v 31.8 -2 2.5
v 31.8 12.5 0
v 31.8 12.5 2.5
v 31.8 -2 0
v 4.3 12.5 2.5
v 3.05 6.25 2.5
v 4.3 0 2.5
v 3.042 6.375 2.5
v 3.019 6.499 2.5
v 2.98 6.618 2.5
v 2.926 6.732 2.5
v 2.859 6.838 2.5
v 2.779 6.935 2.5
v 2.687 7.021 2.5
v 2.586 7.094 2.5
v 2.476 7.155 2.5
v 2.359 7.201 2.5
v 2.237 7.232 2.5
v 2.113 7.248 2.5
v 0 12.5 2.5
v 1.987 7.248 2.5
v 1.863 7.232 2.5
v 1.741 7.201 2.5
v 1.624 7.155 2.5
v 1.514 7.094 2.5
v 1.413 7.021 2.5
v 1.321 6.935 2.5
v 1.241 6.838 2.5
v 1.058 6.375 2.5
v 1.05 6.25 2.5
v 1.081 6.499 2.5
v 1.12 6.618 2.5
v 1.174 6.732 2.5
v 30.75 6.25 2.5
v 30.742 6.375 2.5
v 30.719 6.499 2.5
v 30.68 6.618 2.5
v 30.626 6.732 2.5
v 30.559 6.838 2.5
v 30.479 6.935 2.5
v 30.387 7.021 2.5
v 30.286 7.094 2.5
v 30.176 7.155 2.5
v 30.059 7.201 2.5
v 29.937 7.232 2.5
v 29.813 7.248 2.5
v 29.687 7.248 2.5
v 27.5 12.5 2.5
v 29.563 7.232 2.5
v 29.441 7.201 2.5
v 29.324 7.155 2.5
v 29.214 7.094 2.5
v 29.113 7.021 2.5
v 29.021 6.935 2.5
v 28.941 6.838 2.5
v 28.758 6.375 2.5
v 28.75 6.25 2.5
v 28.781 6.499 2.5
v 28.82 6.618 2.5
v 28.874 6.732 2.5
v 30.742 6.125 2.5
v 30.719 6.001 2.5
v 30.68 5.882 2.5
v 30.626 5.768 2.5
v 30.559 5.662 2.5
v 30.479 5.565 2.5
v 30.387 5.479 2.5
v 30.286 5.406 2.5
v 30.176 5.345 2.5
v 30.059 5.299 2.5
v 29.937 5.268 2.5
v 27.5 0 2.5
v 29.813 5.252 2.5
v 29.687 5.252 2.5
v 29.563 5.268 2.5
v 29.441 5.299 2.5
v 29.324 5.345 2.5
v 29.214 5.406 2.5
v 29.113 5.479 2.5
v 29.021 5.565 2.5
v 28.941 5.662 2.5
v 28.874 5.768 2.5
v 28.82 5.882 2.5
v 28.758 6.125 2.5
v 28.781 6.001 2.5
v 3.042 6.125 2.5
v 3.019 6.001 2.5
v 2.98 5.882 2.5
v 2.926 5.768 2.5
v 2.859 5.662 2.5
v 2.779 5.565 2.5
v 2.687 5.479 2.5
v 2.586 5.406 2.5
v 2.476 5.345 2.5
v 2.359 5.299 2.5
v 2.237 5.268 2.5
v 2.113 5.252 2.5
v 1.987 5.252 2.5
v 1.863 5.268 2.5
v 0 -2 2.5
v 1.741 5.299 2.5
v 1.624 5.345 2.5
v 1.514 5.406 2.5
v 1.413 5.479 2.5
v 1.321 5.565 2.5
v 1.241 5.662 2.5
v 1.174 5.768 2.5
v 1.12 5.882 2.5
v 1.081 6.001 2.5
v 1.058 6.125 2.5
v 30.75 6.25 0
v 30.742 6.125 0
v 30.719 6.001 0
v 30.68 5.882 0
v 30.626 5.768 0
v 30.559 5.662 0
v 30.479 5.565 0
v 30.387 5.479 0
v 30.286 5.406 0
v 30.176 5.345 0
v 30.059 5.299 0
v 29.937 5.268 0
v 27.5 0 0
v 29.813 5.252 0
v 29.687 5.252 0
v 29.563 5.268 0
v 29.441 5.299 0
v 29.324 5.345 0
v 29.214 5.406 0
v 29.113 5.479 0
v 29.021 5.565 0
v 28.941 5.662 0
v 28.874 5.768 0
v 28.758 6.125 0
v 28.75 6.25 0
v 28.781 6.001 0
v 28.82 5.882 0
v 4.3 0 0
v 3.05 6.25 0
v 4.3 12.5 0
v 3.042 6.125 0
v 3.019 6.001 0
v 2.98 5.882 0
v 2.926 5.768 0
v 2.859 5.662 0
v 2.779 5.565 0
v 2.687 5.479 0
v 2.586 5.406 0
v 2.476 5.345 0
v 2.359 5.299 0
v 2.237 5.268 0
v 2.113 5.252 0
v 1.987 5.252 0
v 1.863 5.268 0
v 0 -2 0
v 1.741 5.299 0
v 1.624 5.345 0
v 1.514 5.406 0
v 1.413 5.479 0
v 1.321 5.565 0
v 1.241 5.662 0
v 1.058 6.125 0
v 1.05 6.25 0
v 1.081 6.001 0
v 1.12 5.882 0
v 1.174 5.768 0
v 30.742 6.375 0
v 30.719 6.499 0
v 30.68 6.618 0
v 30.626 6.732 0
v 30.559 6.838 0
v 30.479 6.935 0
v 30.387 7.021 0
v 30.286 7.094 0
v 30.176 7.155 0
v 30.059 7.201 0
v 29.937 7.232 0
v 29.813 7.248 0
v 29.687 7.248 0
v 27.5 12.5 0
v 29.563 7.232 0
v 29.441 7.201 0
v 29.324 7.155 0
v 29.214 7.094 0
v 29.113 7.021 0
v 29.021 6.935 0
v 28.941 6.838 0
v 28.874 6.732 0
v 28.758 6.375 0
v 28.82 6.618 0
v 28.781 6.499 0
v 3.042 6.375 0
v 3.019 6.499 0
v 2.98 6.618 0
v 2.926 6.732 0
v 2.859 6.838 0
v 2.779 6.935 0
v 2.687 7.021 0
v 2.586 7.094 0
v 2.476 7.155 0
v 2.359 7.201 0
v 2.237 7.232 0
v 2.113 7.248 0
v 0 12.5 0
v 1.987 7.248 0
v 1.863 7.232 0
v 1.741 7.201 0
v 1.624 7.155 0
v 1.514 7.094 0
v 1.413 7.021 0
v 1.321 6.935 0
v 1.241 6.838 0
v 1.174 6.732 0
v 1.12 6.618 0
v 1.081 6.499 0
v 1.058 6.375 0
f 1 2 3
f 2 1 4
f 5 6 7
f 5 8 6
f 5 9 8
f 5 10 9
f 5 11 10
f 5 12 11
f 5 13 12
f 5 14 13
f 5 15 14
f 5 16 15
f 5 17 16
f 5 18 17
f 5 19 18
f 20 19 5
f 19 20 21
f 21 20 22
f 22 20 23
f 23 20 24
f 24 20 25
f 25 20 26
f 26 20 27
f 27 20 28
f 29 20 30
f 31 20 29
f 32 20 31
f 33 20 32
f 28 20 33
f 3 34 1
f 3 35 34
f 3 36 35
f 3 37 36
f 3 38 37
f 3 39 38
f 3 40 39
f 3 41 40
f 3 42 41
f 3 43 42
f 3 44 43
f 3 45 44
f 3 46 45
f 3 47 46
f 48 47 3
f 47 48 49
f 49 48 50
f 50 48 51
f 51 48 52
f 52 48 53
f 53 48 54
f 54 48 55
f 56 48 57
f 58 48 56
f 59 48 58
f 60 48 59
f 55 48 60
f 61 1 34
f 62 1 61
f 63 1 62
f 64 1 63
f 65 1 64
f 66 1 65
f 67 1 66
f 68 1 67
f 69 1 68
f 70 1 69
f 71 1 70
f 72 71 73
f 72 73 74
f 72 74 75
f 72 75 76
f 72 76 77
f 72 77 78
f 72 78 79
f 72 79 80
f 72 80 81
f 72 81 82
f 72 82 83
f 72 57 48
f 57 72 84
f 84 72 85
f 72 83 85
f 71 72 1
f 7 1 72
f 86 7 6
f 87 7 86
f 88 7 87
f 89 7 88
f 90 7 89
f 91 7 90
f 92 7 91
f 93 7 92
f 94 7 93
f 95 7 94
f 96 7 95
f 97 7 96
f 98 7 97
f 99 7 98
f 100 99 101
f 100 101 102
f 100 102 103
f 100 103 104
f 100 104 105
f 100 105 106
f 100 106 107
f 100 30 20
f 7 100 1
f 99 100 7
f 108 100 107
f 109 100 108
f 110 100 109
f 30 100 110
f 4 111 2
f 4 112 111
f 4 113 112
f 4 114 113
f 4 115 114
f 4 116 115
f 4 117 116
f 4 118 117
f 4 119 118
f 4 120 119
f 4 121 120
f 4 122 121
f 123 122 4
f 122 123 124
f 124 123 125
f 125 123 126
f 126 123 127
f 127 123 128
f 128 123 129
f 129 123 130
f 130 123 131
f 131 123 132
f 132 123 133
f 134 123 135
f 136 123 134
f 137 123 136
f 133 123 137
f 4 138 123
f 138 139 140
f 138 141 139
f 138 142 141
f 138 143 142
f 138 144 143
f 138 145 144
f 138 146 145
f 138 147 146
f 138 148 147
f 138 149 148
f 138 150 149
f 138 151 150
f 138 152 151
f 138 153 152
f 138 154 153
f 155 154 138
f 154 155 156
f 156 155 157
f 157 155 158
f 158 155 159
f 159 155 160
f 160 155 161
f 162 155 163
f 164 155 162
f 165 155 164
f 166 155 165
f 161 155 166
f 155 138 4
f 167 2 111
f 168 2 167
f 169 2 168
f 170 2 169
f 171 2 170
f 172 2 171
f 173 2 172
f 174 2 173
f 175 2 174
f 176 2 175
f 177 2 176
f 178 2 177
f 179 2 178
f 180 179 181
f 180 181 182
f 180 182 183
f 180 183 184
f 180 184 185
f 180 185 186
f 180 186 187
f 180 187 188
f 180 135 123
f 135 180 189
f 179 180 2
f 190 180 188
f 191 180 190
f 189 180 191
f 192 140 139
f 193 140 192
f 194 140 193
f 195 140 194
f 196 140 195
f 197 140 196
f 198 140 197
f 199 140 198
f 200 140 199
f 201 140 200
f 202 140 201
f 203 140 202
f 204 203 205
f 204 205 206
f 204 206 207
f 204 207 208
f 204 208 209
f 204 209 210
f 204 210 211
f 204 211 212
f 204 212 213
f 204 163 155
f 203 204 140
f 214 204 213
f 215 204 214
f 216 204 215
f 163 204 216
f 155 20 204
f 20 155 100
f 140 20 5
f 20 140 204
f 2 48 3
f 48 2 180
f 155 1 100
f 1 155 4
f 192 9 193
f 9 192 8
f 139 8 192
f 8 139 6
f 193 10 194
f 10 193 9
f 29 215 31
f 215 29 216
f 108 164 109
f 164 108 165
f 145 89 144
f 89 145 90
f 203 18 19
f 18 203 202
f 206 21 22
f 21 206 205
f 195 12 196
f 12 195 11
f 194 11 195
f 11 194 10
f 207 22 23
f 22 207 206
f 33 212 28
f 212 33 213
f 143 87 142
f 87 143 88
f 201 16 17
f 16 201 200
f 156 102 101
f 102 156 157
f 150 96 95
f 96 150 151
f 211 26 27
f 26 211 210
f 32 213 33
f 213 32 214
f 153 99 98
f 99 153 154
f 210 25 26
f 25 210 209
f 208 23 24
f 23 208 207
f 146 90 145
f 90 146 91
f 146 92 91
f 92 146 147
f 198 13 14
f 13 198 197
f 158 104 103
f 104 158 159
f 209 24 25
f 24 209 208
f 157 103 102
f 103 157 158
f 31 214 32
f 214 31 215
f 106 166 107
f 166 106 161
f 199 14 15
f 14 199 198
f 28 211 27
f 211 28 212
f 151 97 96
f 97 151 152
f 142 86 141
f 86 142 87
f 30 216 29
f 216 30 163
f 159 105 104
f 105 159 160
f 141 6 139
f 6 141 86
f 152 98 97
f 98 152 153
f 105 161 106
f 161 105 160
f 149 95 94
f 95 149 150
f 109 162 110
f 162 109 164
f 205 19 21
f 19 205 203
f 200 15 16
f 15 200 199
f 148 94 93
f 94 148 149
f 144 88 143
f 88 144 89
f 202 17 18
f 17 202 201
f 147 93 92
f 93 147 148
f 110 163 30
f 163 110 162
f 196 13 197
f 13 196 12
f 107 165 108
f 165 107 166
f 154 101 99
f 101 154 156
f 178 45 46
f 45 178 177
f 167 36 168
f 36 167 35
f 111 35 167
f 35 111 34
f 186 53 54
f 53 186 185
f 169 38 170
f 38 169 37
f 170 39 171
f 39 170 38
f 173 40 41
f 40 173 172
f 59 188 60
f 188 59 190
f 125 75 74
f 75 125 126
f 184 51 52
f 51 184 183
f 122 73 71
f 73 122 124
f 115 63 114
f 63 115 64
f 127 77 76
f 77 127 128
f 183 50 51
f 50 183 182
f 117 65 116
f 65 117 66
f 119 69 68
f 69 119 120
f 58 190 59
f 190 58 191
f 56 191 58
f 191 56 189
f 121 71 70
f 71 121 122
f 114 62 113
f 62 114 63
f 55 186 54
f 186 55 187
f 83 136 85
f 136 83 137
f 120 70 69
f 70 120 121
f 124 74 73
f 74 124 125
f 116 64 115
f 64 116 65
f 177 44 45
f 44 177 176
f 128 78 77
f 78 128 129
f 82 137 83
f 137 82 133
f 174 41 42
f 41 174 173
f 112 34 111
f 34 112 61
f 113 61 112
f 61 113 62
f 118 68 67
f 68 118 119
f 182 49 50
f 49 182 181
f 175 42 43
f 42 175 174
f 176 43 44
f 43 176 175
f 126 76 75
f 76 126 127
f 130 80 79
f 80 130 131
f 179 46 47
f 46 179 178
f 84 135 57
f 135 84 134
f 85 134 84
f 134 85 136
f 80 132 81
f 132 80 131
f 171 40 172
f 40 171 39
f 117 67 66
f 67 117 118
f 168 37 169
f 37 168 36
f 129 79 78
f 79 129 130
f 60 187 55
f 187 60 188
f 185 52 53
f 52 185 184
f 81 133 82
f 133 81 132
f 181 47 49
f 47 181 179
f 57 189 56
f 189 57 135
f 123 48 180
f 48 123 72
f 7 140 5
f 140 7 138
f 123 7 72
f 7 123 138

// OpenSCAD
// file: fillets.scad
// 2d primitive for outside fillets.

module fil_2d_o(r, angle=90) {

  intersection() {

    circle(r=r);

    polygon([

      [0, 0],

      [0, r],

      [r * tan(angle/2), r],

      [r * sin(angle), r * cos(angle)]

    ]);

  }

}



// 2d primitive for inside fillets.

module fil_2d_i(r, angle=90) {

  difference() {

    polygon([

      [0, 0],

      [0, -r],

      [-r * tan(angle/2), -r],

      [-r * sin(angle), -r * cos(angle)]

    ]);

    circle(r=r);

  }

}



// 3d polar outside fillet.

module fil_polar_o(R, r, angle=90) {

  rotate_extrude(convexity=10) {

    translate([R, 0, 0]) {

      fil_2d_o(r, angle);

    }

  }

}



// 3d polar inside fillet.

module fil_polar_i(R, r, angle=90) {

  rotate_extrude(convexity=10) {

    translate([R, 0, 0]) {

      fil_2d_i(r, angle);

    }

  }

}



// 3d linear outside fillet.

module fil_linear_o(l, r, angle=90) {

  rotate([0, -90, 180]) {

    linear_extrude(height=l, center=false) {

      fil_2d_o(r, angle);

    }

  }

}



// 3d linear inside fillet.

module fil_linear_o(l, r, angle=90) {

  rotate([0, -90, 180]) {

    linear_extrude(height=l, center=false) {

      fil_2d_i(r, angle);

    }

  }

}
// main file
use <fillets.scad>

// Based on http://www.thingiverse.com/thing:115972

$fn=50;
fudge=0.1;


servo_arm_hub_radi=7.7/2;
servo_arm_hub_radi2 = servo_arm_hub_radi - 1;
servo_arm_hub_height=4.30;
servo_arm_hub_center_hole_radi=2.4/2;
servo_arm_hub_center_countersink_radi=6/2;
servo_arm_hub_center_countersink_height=0;

servo_arm_tip_radi=4/2;
servo_arm_tip_height=3;
servo_arm_length=26.42;
servo_arm_centerhubtooutterpin=19.49-2*servo_arm_tip_radi-servo_arm_tip_radi;
servo_arm_pin_spacing=9/3;
servo_arm_pin_hole_radi=1.5/2;
servo_arm_fudge_factor=.2;

servo_drive_pin_radi=4.7/2;
servo_drive_pin_height=3.0;

servo_plate_len = 31.8;
servo_plate_width = 12.5;
servo_plate_thickness = 2.5;
servo_plate_screw_radi = 2/2;
servo_plate_screw_distance = 27.7;
servo_plate_screw_offset = (servo_plate_len - servo_plate_screw_distance)/2;
servo_plate_internal_len = 23;


camera_holder_arm_thickness=6.0;
camera_holder_arm_servo_hub_radi=18.5/2;
camera_holder_plate_offset=35;
camera_holder_plate_width=46+(2*camera_holder_arm_thickness);
camera_holder_plate_height=33;
camera_holder_plate_thickness=6;
camera_holder_plate_Attachment_bracket_x=15;
camera_holder_plate_Attachment_bracket_z=3 ;
camera_holder_plate_Attachment_bracket_screw_radi=3.55/2;
camera_holder_plate_Attachment_bracket_screw_nut_size=6.60/2;
camera_holder_plate_Attachment_bracket_screw_offset=9.5;

camera_holder_plate_Attachment_bracket_screw_head_radi=6.5/2;
camera_holder_plate_Attachment_bracket_screw_head_height=3.5;


Plate_Height=4.0;
Plate_Corner_Radi=4;
Plate_X_Size=48;
Plate_Y_Size=48;
Plate_Hole_Radi=3.2/2;

servo_hight = 21.4;

//exploded_view();

//new_exploded_view();

//new_cam_holder();
servo_bracket();
//camera_holder_arm_w_servo_cutout();

//camera_holder_no_cutout();

//camera_holder_arm_w_bearing_cutout();
//camera_holder_arm_w_servo_hub_cutout();

/*
translate([0,0,camera_holder_plate_thickness])
rotate([180,0,0])
camera_holder_plate();
*/

//lower_pivot_bearing_holder();

//upper_pivot_bearing_holder();

//mounting_plate();

//##########################################################
//##########################################################
// Test Stuff Below....
//##########################################################
//##########################################################

//servo_arm(0);
//color("red") translate([10,0,0]) servo_arm_negative();
//camera_holder();

//color("blue")
   //servo();
//MakePlate();

//fil_linear_o(20,2);

//##########################################################
//##########################################################


//##########################################################
module mounting_plate () {
//##########################################################

   mount_height=32;

   difference() {
   union() {
       MakePlate();

     hull() {
      translate([0,10,0])
       cylinder(r=7/2,h=mount_height);
      translate([0,38,0])
       cylinder(r=7/2,h=mount_height);
     }

     hull() {
      translate([Plate_Y_Size,10,0])
       cylinder(r=7/2,h=mount_height);
      translate([Plate_Y_Size,38,0])
       cylinder(r=7/2,h=mount_height);
     }

     hull() {
      translate([0,10,0])
       cylinder(r=7/2,h=mount_height);
      translate([Plate_Y_Size,10,0])
       cylinder(r=7/2,h=mount_height);
     }

     hull() {
      translate([0,38,0])
       cylinder(r=7/2,h=mount_height);
      translate([Plate_Y_Size,38,0])
       cylinder(r=7/2,h=mount_height);
     }

   }

   // Screw Holes
   translate([-.1,19,-fudge+15])
      cylinder(r=3/2,h=20);

   translate([-.1,29,-fudge+15])
      cylinder(r=3/2,h=20);

   translate([48.1,19,-fudge+15])
      cylinder(r=3/2,h=20);

   translate([48.1,29,-fudge+15])
      cylinder(r=3/2,h=20);

   hull() {
   translate([-6.2,Plate_Y_Size/2,7.5])
   rotate([0,90,0])
   cylinder(r=3,h=10);

   translate([-6.2,Plate_Y_Size/2,24])
   rotate([0,90,0])
   cylinder(r=3,h=10);

   }

   hull() {
   translate([44.4,Plate_Y_Size/2,7.5])
   rotate([0,90,0])
   cylinder(r=3,h=10);

   translate([44.4,Plate_Y_Size/2,24])
   rotate([0,90,0])
   cylinder(r=3,h=10);

   }

   translate([Plate_Y_Size/2,13.8,31])
   rotate([90,90,0])
   cylinder(r=20.5,h=10,$fn=200);

   translate([Plate_Y_Size/2,44.2,31])
   rotate([90,90,0])
   cylinder(r=20.5,h=10,$fn=200);


   }


}


//##########################################################


//##########################################################
module exploded_view (angle=0)
//##########################################################
{

    color("Purple")
    translate([camera_holder_plate_width,camera_holder_plate_height/2,
           camera_holder_plate_Attachment_bracket_z+camera_holder_plate_thickness])
        rotate([0,-90,0])
            camera_holder_arm_w_servo_cutout();

    color("Purple")
    translate([0,camera_holder_plate_height/2,
           camera_holder_plate_Attachment_bracket_z+camera_holder_plate_thickness])
         rotate([0,-90,180])
            camera_holder_arm_w_bearing_cutout();

    color("green")
    translate([0,camera_holder_plate_height,camera_holder_plate_thickness])
         rotate([180,0,0])
            camera_holder_plate();

    translate([camera_holder_plate_width-5.5,camera_holder_plate_height/2,camera_holder_plate_offset+camera_holder_plate_thickness+camera_holder_plate_Attachment_bracket_z])
    rotate([0,90,0])
    union() {
        color("Blue")
        servo_arm(0);
        rotate([0,0,angle])
        color("yellow")
        servo();
    }

    color("LightBlue")
    translate([-3.7,camera_holder_plate_height/2,camera_holder_plate_offset+camera_holder_plate_thickness+camera_holder_plate_Attachment_bracket_z])
    rotate([0,90,0])
    upper_pivot_bearing_holder();

    color("LightBlue")
    translate([6.5,camera_holder_plate_height/2,camera_holder_plate_offset+camera_holder_plate_thickness+camera_holder_plate_Attachment_bracket_z])
    rotate([0,-90,0])
    lower_pivot_bearing_holder();

}

//##########################################################
module camera_holder_plate()
//##########################################################
{

    hole1_2_x=camera_holder_plate_Attachment_bracket_z+(camera_holder_arm_thickness/2+.5);
    hole1_3_y=(camera_holder_plate_height/2)-camera_holder_plate_Attachment_bracket_screw_offset;
    hole2_4_y=(camera_holder_plate_height/2)+camera_holder_plate_Attachment_bracket_screw_offset;

    hole3_4_x=camera_holder_plate_width-(camera_holder_plate_Attachment_bracket_z+(camera_holder_arm_thickness/2+.5));

    difference() {
        cube([camera_holder_plate_width,
              camera_holder_plate_height,
              camera_holder_plate_thickness]);

        // Four screw holes
        translate([hole1_2_x,hole1_3_y,-fudge])
            cylinder(r=camera_holder_plate_Attachment_bracket_screw_radi,
                     h=camera_holder_plate_thickness+(2*fudge));

        translate([hole1_2_x,hole2_4_y,-fudge])
            cylinder(r=camera_holder_plate_Attachment_bracket_screw_radi,
                     h=camera_holder_plate_thickness+(2*fudge));

        translate([hole3_4_x,hole1_3_y,-fudge])
            cylinder(r=camera_holder_plate_Attachment_bracket_screw_radi,
                     h=camera_holder_plate_thickness+(2*fudge));

        translate([hole3_4_x,hole2_4_y,-fudge])
            cylinder(r=camera_holder_plate_Attachment_bracket_screw_radi,
                     h=camera_holder_plate_thickness+(2*fudge));

        // Four screw countersinks
        translate([hole1_2_x,hole1_3_y,-fudge])
            cylinder(r=camera_holder_plate_Attachment_bracket_screw_head_radi,
                     h=camera_holder_plate_Attachment_bracket_screw_head_height+(2*fudge));
        translate([hole1_2_x,hole2_4_y,-fudge])
            cylinder(r=camera_holder_plate_Attachment_bracket_screw_head_radi,
                     h=camera_holder_plate_Attachment_bracket_screw_head_height+(2*fudge));
        translate([hole3_4_x,hole1_3_y,-fudge])
            cylinder(r=camera_holder_plate_Attachment_bracket_screw_head_radi,
                     h=camera_holder_plate_Attachment_bracket_screw_head_height+(2*fudge));
        translate([hole3_4_x,hole2_4_y,-fudge])
            cylinder(r=camera_holder_plate_Attachment_bracket_screw_head_radi,
                     h=camera_holder_plate_Attachment_bracket_screw_head_height+(2*fudge));


     }

tab_offset=10;
tab_height=42;

     hull() {
     translate([camera_holder_plate_width/2+tab_offset,8,0])
     rotate([180,0,0])
     cylinder(r=4,h=tab_height);
     translate([camera_holder_plate_width/2-tab_offset,8,0])
     rotate([180,0,0])
     cylinder(r=4,h=tab_height);
     }
}



//##########################################################
module camera_holder_arm_w_bearing_cutout ()
//##########################################################
{

   translate([0,0,camera_holder_arm_thickness])
   rotate([0,90,0])
   union() {
   difference() {
       union() {
	    // Camera Holder Arms
        hull() {
            translate([0,0,camera_holder_plate_offset])
                rotate([0,90,0])
                     cylinder(r=camera_holder_arm_servo_hub_radi,
                              h=camera_holder_arm_thickness);
            translate([0,-camera_holder_plate_height/2,0])
                cube([camera_holder_arm_thickness,camera_holder_plate_height,1]);
        }
        // Plate Attachment bracket
        translate([-camera_holder_plate_Attachment_bracket_x+camera_holder_arm_thickness,
                   -camera_holder_plate_height/2,
                   -camera_holder_plate_Attachment_bracket_z+fudge])
        cube([camera_holder_plate_Attachment_bracket_x,
               camera_holder_plate_height,
               camera_holder_plate_Attachment_bracket_z]);
        }

        //translate([-fudge,0,camera_holder_plate_offset])
        //rotate([0,90,0])
        //servo_arm_negative();

        //translate([camera_holder_arm_thickness-2+fudge-.3,0,camera_holder_plate_offset])
        //rotate([0,90,0])
        //cylinder(r=14.5/2+fudge,h=2+.3+fudge);

        translate([camera_holder_arm_thickness-3+fudge,0,camera_holder_plate_offset])
        rotate([0,90,0])
        cylinder(r=10.5/2+fudge,h=3+fudge);

        translate([-fudge,0,camera_holder_plate_offset])
        rotate([0,90,0])
        cylinder(r=12.12/2+fudge,h=2.75+(4*fudge));

        translate([-fudge,0,camera_holder_plate_offset/2-4])
        rotate([0,90,0])
        cylinder(r=22/2+fudge,h=camera_holder_arm_thickness+(4*fudge));

        // Plate Attach screw Holes 
        translate([-(camera_holder_plate_Attachment_bracket_x-camera_holder_arm_thickness)/2,
                   camera_holder_plate_Attachment_bracket_screw_offset,
                   -camera_holder_plate_Attachment_bracket_z])
        cylinder(r=camera_holder_plate_Attachment_bracket_screw_radi,
                 h=camera_holder_plate_Attachment_bracket_z+(2*fudge));
        translate([-(camera_holder_plate_Attachment_bracket_x-camera_holder_arm_thickness)/2,
                   -camera_holder_plate_Attachment_bracket_screw_offset,
                   -camera_holder_plate_Attachment_bracket_z])
        cylinder(r=camera_holder_plate_Attachment_bracket_screw_radi,
                 h=camera_holder_plate_Attachment_bracket_z+(2*fudge));

        translate([-(camera_holder_plate_Attachment_bracket_x-camera_holder_arm_thickness)/2,
                   camera_holder_plate_Attachment_bracket_screw_offset,
                   -2])
        rotate([0,0,30])
        cylinder(r=camera_holder_plate_Attachment_bracket_screw_nut_size,
                 h=2+(2*fudge),$fn=6);

        translate([-(camera_holder_plate_Attachment_bracket_x-camera_holder_arm_thickness)/2,
                   -camera_holder_plate_Attachment_bracket_screw_offset,
                   -2])
        rotate([0,0,30])
        cylinder(r=camera_holder_plate_Attachment_bracket_screw_nut_size,
                 h=2+(2*fudge),$fn=6);


    }

        //translate([camera_holder_arm_thickness-2-.1,0,camera_holder_plate_offset])
        //rotate([0,90,0])
        //#cylinder(r=14/2+fudge,h=.2);
    }

}


module camera_holder_no_cutout () {
    

   translate([0,0,camera_holder_arm_thickness])
   rotate([0,90,0])
   difference() {
       union() {
	    // Camera Holder Arms
        hull() {
            translate([0,0,camera_holder_plate_offset])
                rotate([0,90,0])
                     cylinder(r=camera_holder_arm_servo_hub_radi,
                              h=camera_holder_arm_thickness);
            translate([0,-camera_holder_plate_height/2,0])
                cube([camera_holder_arm_thickness,camera_holder_plate_height,1]);
        }
        // Plate Attachment bracket
        translate([-camera_holder_plate_Attachment_bracket_x+camera_holder_arm_thickness,
                   -camera_holder_plate_height/2,
                   -camera_holder_plate_Attachment_bracket_z+fudge])
        cube([camera_holder_plate_Attachment_bracket_x,
               camera_holder_plate_height,
               camera_holder_plate_Attachment_bracket_z]);
        }

        // Plate Attach screw Holes 
        translate([-(camera_holder_plate_Attachment_bracket_x-camera_holder_arm_thickness)/2,
                   camera_holder_plate_Attachment_bracket_screw_offset,
                   -camera_holder_plate_Attachment_bracket_z])
        cylinder(r=camera_holder_plate_Attachment_bracket_screw_radi,
                 h=camera_holder_plate_Attachment_bracket_z+(2*fudge));
        
        
        translate([-(camera_holder_plate_Attachment_bracket_x-camera_holder_arm_thickness)/2,
                   -camera_holder_plate_Attachment_bracket_screw_offset,
                   -camera_holder_plate_Attachment_bracket_z])
        cylinder(r=camera_holder_plate_Attachment_bracket_screw_radi,
                 h=camera_holder_plate_Attachment_bracket_z+(2*fudge));

        hull() {
        translate([-fudge,5,camera_holder_plate_offset/2-11])
        rotate([0,90,0])
        cylinder(r=8/2+fudge,h=camera_holder_arm_thickness+(4*fudge));

        translate([-fudge,-6,camera_holder_plate_offset/2-11])
        rotate([0,90,0])
        cylinder(r=8/2+fudge,h=camera_holder_arm_thickness+(4*fudge));
        } 

        translate([-(camera_holder_plate_Attachment_bracket_x-camera_holder_arm_thickness)/2,
                   camera_holder_plate_Attachment_bracket_screw_offset,
                   -2])
        rotate([0,0,30])
        cylinder(r=camera_holder_plate_Attachment_bracket_screw_nut_size,
                 h=2+(2*fudge),$fn=6);

        translate([-(camera_holder_plate_Attachment_bracket_x-camera_holder_arm_thickness)/2,
                   -camera_holder_plate_Attachment_bracket_screw_offset,
                   -2])
        rotate([0,0,30])
        cylinder(r=camera_holder_plate_Attachment_bracket_screw_nut_size,
                 h=2+(2*fudge),$fn=6);
    }
}




//##########################################################
module camera_holder_arm_w_servo_hub_cutout ()
//##########################################################
{

   difference() {
      camera_holder_no_cutout();
    /*//
        translate([30.5,-5.2,1])
         cube([10,10,5]);
   //*/
       color("red")            
        translate([0,0,camera_holder_arm_thickness])
          rotate([0,90,0])
          translate([-fudge,0,camera_holder_plate_offset])
            rotate([0,90,0])
    {
            // Center hub center hole
    translate([0,0,-servo_arm_hub_height+servo_arm_tip_height-fudge])
        cylinder(r=servo_arm_hub_center_hole_radi,h=camera_holder_arm_thickness*2);

    // Center hub drive pin hole
    //translate([0,0,-servo_arm_hub_height+servo_arm_tip_height-fudge])
        cylinder(r=servo_drive_pin_radi+0.03,h=servo_drive_pin_height+(2*fudge));

 
    }
    
   }

}

//##########################################################
module camera_holder_arm_w_servo_cutout ()
//##########################################################
{
   difference() {
       camera_holder_no_cutout();
       translate([0,0,camera_holder_arm_thickness])
       rotate([0,90,0])
          translate([-fudge,0,camera_holder_plate_offset])
            rotate([0,90,0])
            servo_arm_negative();
   }

}


//##########################################################
module camera_holder_arm_w_round_cutout()
//##########################################################
{
   difference() {
       camera_holder_no_cutout();
       translate([0,0,camera_holder_arm_thickness])
       rotate([0,90,0])
          translate([-fudge,0,camera_holder_plate_offset])
            rotate([0,90,0])
            servo_arm_negative();
   }

}

//##########################################################
module upper_pivot_bearing_holder()
//##########################################################
{
   translate([0,0,1.4+3.5+2.0])
   rotate([0,180,0])
   union() {
   difference() {
    union() {
    cylinder(r=8/2-fudge,h=1.4);
    translate([0,0,1.4])
      cylinder(r=9.5/2-fudge,h=3.6);
    translate([0,0,3.5])
      cylinder(r=14/2-fudge,h=3.5);
    }
    translate([0,0,-fudge])
    cylinder(r=camera_holder_plate_Attachment_bracket_screw_radi,h=1.4+1.6+2.0+(2*fudge));

    // Screw Head
    translate([0,0,(1.40+1.40)])
    cylinder(r=6.5/2,h=20.+(2*fudge));


   }

    translate([0,0,(1.40+1.40)])
    cylinder(r=6.5/2,h=.2);
   }
}

//##########################################################
module lower_pivot_bearing_holder()
//##########################################################
{
   difference() {
    union() {
    cylinder(r=9.5/2-fudge,h=1.4);
    cylinder(r=8/2-fudge,h=1.40+1.4);
    }
    translate([0,0,-fudge])
    cylinder(r=camera_holder_plate_Attachment_bracket_screw_radi,h=1.40+1.4+(2*fudge));
   }
}

//##########################################################
module camera_holder ()
//##########################################################
{

	// Camera Holder Arms
    hull() {
        translate([0,0,camera_holder_plate_offset])
            rotate([0,90,0])
                 cylinder(r=camera_holder_arm_servo_hub_radi,
                          h=camera_holder_arm_thickness);
        translate([0,-camera_holder_plate_height/2,0])
            cube([camera_holder_arm_thickness,camera_holder_plate_height,1]);
    }

    translate([camera_holder_plate_width-camera_holder_arm_thickness,0,0])
    hull() {
        translate([0,0,camera_holder_plate_offset])
            rotate([0,90,0])
                 cylinder(r=camera_holder_arm_servo_hub_radi,
                          h=camera_holder_arm_thickness);
        translate([0,-camera_holder_plate_height/2,0])
            cube([camera_holder_arm_thickness,camera_holder_plate_height,1]);
    }
    translate([0,-camera_holder_plate_height/2,-camera_holder_plate_thickness+fudge])
    cube([camera_holder_plate_width,camera_holder_plate_height,
          camera_holder_plate_thickness]);

}

//##########################################################
module servo_arm (angle=0)
//##########################################################
{

    rotate([0,0,angle])
    translate([0,0,(servo_arm_hub_height-servo_arm_tip_height)])
    difference() {
        union() {
            hull() {
                cylinder(r=servo_arm_hub_radi2,h=servo_arm_tip_height);
                translate([servo_arm_centerhubtooutterpin,0,0])
                    cylinder(r=servo_arm_tip_radi,h=servo_arm_tip_height);
            }
            // Center Hub
          translate([0,0,-servo_arm_hub_height+servo_arm_tip_height])
                cylinder(r=servo_arm_hub_radi,h=servo_arm_hub_height);
        }

    // Servo Arm Holes
    translate([servo_arm_centerhubtooutterpin,0,-fudge])
        cylinder(r=servo_arm_pin_hole_radi,h=servo_arm_tip_height+(2*fudge));
    translate([servo_arm_centerhubtooutterpin-(1*servo_arm_pin_spacing),0,-fudge])
        cylinder(r=servo_arm_pin_hole_radi+(1*fudge),h=servo_arm_tip_height+(2*fudge));
    translate([servo_arm_centerhubtooutterpin-(2*servo_arm_pin_spacing),0,-fudge])
        cylinder(r=servo_arm_pin_hole_radi,h=servo_arm_tip_height+(2*fudge));
    translate([servo_arm_centerhubtooutterpin-(3*servo_arm_pin_spacing),0,-fudge])
        cylinder(r=servo_arm_pin_hole_radi,h=servo_arm_tip_height+(2*fudge));

    // Center hub center hole
    translate([0,0,-servo_arm_hub_height+servo_arm_tip_height-fudge])
        cylinder(r=servo_arm_hub_center_hole_radi,h=servo_arm_hub_height+(2*fudge));

    // Center hub drive pin hole
    translate([0,0,-servo_arm_hub_height+servo_arm_tip_height-fudge])
        cylinder(r=servo_drive_pin_radi,h=servo_drive_pin_height+(2*fudge));

    // Center hub countersink for screw
    translate([0,0,servo_arm_tip_height-servo_arm_hub_center_countersink_height])
        cylinder(r=servo_arm_hub_center_countersink_radi,
                 h=servo_arm_hub_center_countersink_height+fudge);
    }
}

module servo_hub_negative(angle = 0)
{
        rotate([0,0,angle]) {
        cylinder(r=servo_arm_hub_radi+servo_arm_fudge_factor,h=servo_arm_hub_height);
    }
    // Center hub countersink for screw
    translate([0,0,servo_arm_hub_height-fudge])
        cylinder(r=servo_arm_hub_center_hole_radi,
                 h=servo_arm_hub_height+fudge);
    
}
//##########################################################
module servo_arm_negative (angle=0)
//##########################################################
{
    servo_hub_negative(angle);
    
    hull() {
        cylinder(r=servo_arm_hub_radi2+servo_arm_fudge_factor,h=servo_arm_hub_height);
        translate([servo_arm_centerhubtooutterpin,0,0])
            cylinder(r=servo_arm_tip_radi+servo_arm_fudge_factor,h=servo_arm_hub_height);
    }
    

}


//##########################################################
module MakePlate() {
//##########################################################
	difference() {	
		minkowski() {
			cube([Plate_X_Size,Plate_Y_Size,Plate_Height/2]);
			cylinder(r=Plate_Corner_Radi,h=Plate_Height/2);

		}

		// Holes
   	translate([0,0,-fudge]) 
		cylinder(r=Plate_Hole_Radi,h=Plate_Height+(2*fudge));
   	translate([Plate_X_Size,0,-fudge]) 
		cylinder(r=Plate_Hole_Radi,h=Plate_Height+(2*fudge));
   	translate([0,Plate_Y_Size,-fudge]) 
		cylinder(r=Plate_Hole_Radi,h=Plate_Height+(2*fudge));
   	translate([Plate_X_Size,Plate_Y_Size,-fudge]) 
		cylinder(r=Plate_Hole_Radi,h=Plate_Height+(2*fudge));
	}
}

module servo() {
    translate([-10.6,5.9,-27.2])
      rotate([90,0,0])   
       import("Servo9g.stl");
}

module servo_bracket() {
   difference() {
       translate([0,-2,0])
            cube([servo_plate_len, servo_plate_width+2, servo_plate_thickness]);
            
            // Holes for screws
            translate([servo_plate_screw_offset,servo_plate_width/2,0])
               cylinder(r=servo_plate_screw_radi, h=servo_plate_thickness*2+1,center=true);
            translate([servo_plate_screw_offset+servo_plate_screw_distance,servo_plate_width/2,0])
               cylinder(r=servo_plate_screw_radi, h=servo_plate_thickness*2+1,center=true); 
       
    // place for servo
    translate([(servo_plate_len-servo_plate_internal_len)/2-fudge, 0,-1])
              cube([servo_plate_internal_len+2*fudge, servo_plate_width+5, servo_plate_thickness+3]);
   }
}

module new_cam_holder() {
    translate([-10.5,-servo_plate_width/2,-9]) 
    {
        servo_bracket();

    translate([0,-2.1,-servo_hight+servo_plate_thickness+1])
       cube([servo_plate_len, 2.5, servo_hight-1]);  
        
     color("green")   
     translate([15.7,-4.2,-5.5]) 
      rotate([90,0,0])
         import("livcam_cinima_round_mount.stl");  
    }      
        
        /*
        servo_plate_len = 32;
servo_plate_width = 12;
servo_plate_thickness = 1;
servo_plate_screw_radi = 2/2;
servo_plate_screw_distance = 27.7/2;
        servo_plate_screw_offset
        servo_plate_internal_len = 22.4;

        */
}

//##########################################################
module new_exploded_view (angle=0)
//##########################################################
{

    color("Purple")
    translate([camera_holder_plate_width,camera_holder_plate_height/2,
           camera_holder_plate_Attachment_bracket_z+camera_holder_plate_thickness])
        rotate([0,-90,0])
            camera_holder_arm_w_servo_cutout();

    
        translate([camera_holder_plate_width-5.5,camera_holder_plate_height/2,camera_holder_plate_offset+camera_holder_plate_thickness+camera_holder_plate_Attachment_bracket_z])
    rotate([0,90,0])
    union() {
        color("Blue")
        servo_arm(0);
        rotate([0,0,angle])
        color("yellow")
        servo();
        
        //color("green") 
            new_cam_holder();

        
    
    }
}
